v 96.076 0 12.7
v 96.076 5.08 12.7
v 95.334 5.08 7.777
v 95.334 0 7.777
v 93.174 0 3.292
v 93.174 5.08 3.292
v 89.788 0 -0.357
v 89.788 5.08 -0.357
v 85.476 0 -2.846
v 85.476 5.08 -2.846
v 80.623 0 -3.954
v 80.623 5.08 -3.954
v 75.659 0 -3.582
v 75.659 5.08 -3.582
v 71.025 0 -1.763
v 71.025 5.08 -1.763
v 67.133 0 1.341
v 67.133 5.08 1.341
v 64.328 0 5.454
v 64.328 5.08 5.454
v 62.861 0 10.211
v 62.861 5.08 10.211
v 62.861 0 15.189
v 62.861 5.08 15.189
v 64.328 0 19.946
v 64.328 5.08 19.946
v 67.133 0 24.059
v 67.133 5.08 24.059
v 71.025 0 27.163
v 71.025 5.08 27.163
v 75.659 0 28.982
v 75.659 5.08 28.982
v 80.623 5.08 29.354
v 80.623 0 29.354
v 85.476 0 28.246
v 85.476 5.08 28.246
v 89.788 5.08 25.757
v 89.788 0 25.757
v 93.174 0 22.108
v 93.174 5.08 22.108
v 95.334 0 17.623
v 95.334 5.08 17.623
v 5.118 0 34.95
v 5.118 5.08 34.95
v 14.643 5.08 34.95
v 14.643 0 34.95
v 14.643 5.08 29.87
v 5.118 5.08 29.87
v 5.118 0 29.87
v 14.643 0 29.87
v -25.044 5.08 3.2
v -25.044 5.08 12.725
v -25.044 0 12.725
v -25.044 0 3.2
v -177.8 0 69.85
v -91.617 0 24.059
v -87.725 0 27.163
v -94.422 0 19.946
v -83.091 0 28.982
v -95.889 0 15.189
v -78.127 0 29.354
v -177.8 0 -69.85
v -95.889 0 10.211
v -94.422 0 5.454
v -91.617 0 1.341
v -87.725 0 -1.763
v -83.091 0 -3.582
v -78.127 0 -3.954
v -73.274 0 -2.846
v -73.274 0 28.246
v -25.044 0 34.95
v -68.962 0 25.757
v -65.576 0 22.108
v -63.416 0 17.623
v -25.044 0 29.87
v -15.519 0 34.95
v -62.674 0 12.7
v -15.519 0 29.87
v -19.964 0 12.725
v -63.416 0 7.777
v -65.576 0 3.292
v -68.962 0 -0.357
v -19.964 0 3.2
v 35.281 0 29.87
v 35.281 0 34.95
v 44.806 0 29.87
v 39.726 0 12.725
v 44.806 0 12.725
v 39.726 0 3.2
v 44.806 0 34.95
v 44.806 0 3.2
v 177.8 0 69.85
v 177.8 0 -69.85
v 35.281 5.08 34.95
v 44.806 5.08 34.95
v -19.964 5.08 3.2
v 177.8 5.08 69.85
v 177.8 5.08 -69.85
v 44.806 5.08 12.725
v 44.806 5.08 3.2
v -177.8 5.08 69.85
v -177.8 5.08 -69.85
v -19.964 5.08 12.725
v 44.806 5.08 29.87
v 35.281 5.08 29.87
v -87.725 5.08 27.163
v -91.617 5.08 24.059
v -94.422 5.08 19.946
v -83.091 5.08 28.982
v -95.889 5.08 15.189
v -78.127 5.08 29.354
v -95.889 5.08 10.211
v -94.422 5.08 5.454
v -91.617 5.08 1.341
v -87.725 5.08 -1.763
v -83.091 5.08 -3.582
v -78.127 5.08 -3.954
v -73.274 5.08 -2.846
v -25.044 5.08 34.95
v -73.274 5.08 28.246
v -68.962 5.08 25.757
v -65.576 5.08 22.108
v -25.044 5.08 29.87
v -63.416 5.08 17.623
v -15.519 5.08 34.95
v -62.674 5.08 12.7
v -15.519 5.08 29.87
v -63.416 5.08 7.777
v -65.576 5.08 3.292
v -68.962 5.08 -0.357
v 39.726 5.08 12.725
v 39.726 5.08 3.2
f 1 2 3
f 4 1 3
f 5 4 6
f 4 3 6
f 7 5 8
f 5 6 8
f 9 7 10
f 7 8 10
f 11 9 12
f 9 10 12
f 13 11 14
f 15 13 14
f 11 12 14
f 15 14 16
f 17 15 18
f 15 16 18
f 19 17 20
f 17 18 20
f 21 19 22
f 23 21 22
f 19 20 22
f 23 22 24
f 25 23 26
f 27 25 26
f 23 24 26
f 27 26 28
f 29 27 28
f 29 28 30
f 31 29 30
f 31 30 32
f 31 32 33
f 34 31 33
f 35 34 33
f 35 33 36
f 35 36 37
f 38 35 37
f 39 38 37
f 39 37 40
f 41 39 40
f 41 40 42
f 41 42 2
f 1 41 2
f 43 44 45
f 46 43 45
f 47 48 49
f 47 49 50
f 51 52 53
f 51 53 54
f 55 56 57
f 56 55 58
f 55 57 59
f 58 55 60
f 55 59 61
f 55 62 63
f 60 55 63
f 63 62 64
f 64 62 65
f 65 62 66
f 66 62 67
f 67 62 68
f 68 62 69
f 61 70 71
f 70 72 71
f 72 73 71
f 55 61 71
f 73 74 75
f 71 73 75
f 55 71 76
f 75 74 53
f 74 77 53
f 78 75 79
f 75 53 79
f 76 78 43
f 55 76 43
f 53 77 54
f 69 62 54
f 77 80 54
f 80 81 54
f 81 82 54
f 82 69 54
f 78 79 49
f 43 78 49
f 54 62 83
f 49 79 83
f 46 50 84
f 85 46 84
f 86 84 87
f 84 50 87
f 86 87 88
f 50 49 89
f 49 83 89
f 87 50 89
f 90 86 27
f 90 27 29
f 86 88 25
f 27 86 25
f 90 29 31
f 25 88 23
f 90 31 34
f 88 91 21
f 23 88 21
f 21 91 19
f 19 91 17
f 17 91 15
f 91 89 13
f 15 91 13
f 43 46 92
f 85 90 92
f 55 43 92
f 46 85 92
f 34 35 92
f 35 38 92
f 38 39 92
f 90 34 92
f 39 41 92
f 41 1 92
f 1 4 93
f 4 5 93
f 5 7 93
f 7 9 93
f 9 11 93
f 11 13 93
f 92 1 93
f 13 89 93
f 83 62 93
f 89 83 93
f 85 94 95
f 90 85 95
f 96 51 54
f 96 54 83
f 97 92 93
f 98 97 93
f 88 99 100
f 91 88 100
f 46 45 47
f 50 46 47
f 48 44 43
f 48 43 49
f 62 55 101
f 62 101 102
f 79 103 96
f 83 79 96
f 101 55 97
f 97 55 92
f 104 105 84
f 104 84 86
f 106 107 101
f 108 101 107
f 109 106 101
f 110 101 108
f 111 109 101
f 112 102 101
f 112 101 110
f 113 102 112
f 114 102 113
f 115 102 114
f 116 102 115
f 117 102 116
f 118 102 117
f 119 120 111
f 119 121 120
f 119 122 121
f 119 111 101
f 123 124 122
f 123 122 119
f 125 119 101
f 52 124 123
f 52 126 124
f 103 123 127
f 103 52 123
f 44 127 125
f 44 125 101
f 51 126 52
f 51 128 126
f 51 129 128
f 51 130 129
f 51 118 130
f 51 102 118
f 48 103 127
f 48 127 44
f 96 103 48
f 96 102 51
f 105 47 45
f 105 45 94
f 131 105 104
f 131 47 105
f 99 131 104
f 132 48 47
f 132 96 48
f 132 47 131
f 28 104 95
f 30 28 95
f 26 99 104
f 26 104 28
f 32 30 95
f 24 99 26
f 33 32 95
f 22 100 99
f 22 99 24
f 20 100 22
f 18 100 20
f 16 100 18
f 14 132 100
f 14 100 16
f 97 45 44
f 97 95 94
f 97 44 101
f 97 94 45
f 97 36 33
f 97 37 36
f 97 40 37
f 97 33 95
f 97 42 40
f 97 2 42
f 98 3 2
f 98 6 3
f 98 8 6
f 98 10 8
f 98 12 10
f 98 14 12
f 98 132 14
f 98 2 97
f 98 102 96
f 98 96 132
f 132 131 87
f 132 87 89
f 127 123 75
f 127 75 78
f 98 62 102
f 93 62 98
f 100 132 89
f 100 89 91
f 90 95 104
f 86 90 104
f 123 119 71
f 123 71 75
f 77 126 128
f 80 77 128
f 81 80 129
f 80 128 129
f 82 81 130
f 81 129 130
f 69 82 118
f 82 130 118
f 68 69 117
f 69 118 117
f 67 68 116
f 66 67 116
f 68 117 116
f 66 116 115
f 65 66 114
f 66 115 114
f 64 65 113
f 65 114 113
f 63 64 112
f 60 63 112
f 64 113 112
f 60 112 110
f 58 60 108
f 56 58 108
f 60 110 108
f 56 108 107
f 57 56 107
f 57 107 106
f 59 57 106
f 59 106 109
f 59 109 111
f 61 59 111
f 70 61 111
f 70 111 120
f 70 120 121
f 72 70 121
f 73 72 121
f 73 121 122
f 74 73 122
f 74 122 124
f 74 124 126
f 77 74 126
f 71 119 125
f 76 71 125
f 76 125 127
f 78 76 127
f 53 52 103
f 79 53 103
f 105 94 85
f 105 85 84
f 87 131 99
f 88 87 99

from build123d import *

# Parameters (mm, degrees)
SKETCH1_W           = 355.6
SKETCH1_H           = 139.7
BOSS_EXTRUDE1_DEPTH = 5.08
SKETCH2_R           = 16.7005
CUT_EXTRUDE1_DEPTH  = 6.08
SKETCH4_W           = 5.08
SKETCH4_H           = 9.525
SKETCH4_W_2         = 9.525
SKETCH4_H_2         = 5.08
CUT_EXTRUDE3_DEPTH  = 6.08


with BuildPart() as part:
    # Sketch1 → Boss-Extrude1 (new body)
    with BuildSketch(Plane(origin=(0, 0, 0), x_dir=(1, 0, 0), z_dir=(0, 1, 0))):
        Rectangle(SKETCH1_W, SKETCH1_H)
    extrude(amount=BOSS_EXTRUDE1_DEPTH)

    # Sketch2 → Cut-Extrude1 (cut, through all)
    with BuildSketch(Plane(origin=(0, 5.08, 0), x_dir=(1, 0, 0), z_dir=(0, 1, 0))):
        with Locations((-79.375, -12.7)):
            Circle(SKETCH2_R)
        with Locations((79.375, -12.7)):
            Circle(SKETCH2_R)
    extrude(amount=-CUT_EXTRUDE1_DEPTH, mode=Mode.SUBTRACT)

    # Sketch4 → Cut-Extrude3 (cut, through all)
    with BuildSketch(Plane(origin=(0, 5.08, 0), x_dir=(1, 0, 0), z_dir=(0, 1, 0))):
        with Locations((-22.5044, -7.9629)):
            Rectangle(SKETCH4_W, SKETCH4_H)
        with Locations((-20.2819, -32.4104)):
            Rectangle(SKETCH4_W_2, SKETCH4_H_2)
        with Locations((9.8806, -32.4104)):
            Rectangle(SKETCH4_W_2, SKETCH4_H_2)
        with Locations((40.0431, -32.4104)):
            Rectangle(SKETCH4_W_2, SKETCH4_H_2)
        with Locations((42.2656, -7.9629)):
            Rectangle(SKETCH4_W, SKETCH4_H)
    extrude(amount=-CUT_EXTRUDE3_DEPTH, mode=Mode.SUBTRACT)


solid = part.part
